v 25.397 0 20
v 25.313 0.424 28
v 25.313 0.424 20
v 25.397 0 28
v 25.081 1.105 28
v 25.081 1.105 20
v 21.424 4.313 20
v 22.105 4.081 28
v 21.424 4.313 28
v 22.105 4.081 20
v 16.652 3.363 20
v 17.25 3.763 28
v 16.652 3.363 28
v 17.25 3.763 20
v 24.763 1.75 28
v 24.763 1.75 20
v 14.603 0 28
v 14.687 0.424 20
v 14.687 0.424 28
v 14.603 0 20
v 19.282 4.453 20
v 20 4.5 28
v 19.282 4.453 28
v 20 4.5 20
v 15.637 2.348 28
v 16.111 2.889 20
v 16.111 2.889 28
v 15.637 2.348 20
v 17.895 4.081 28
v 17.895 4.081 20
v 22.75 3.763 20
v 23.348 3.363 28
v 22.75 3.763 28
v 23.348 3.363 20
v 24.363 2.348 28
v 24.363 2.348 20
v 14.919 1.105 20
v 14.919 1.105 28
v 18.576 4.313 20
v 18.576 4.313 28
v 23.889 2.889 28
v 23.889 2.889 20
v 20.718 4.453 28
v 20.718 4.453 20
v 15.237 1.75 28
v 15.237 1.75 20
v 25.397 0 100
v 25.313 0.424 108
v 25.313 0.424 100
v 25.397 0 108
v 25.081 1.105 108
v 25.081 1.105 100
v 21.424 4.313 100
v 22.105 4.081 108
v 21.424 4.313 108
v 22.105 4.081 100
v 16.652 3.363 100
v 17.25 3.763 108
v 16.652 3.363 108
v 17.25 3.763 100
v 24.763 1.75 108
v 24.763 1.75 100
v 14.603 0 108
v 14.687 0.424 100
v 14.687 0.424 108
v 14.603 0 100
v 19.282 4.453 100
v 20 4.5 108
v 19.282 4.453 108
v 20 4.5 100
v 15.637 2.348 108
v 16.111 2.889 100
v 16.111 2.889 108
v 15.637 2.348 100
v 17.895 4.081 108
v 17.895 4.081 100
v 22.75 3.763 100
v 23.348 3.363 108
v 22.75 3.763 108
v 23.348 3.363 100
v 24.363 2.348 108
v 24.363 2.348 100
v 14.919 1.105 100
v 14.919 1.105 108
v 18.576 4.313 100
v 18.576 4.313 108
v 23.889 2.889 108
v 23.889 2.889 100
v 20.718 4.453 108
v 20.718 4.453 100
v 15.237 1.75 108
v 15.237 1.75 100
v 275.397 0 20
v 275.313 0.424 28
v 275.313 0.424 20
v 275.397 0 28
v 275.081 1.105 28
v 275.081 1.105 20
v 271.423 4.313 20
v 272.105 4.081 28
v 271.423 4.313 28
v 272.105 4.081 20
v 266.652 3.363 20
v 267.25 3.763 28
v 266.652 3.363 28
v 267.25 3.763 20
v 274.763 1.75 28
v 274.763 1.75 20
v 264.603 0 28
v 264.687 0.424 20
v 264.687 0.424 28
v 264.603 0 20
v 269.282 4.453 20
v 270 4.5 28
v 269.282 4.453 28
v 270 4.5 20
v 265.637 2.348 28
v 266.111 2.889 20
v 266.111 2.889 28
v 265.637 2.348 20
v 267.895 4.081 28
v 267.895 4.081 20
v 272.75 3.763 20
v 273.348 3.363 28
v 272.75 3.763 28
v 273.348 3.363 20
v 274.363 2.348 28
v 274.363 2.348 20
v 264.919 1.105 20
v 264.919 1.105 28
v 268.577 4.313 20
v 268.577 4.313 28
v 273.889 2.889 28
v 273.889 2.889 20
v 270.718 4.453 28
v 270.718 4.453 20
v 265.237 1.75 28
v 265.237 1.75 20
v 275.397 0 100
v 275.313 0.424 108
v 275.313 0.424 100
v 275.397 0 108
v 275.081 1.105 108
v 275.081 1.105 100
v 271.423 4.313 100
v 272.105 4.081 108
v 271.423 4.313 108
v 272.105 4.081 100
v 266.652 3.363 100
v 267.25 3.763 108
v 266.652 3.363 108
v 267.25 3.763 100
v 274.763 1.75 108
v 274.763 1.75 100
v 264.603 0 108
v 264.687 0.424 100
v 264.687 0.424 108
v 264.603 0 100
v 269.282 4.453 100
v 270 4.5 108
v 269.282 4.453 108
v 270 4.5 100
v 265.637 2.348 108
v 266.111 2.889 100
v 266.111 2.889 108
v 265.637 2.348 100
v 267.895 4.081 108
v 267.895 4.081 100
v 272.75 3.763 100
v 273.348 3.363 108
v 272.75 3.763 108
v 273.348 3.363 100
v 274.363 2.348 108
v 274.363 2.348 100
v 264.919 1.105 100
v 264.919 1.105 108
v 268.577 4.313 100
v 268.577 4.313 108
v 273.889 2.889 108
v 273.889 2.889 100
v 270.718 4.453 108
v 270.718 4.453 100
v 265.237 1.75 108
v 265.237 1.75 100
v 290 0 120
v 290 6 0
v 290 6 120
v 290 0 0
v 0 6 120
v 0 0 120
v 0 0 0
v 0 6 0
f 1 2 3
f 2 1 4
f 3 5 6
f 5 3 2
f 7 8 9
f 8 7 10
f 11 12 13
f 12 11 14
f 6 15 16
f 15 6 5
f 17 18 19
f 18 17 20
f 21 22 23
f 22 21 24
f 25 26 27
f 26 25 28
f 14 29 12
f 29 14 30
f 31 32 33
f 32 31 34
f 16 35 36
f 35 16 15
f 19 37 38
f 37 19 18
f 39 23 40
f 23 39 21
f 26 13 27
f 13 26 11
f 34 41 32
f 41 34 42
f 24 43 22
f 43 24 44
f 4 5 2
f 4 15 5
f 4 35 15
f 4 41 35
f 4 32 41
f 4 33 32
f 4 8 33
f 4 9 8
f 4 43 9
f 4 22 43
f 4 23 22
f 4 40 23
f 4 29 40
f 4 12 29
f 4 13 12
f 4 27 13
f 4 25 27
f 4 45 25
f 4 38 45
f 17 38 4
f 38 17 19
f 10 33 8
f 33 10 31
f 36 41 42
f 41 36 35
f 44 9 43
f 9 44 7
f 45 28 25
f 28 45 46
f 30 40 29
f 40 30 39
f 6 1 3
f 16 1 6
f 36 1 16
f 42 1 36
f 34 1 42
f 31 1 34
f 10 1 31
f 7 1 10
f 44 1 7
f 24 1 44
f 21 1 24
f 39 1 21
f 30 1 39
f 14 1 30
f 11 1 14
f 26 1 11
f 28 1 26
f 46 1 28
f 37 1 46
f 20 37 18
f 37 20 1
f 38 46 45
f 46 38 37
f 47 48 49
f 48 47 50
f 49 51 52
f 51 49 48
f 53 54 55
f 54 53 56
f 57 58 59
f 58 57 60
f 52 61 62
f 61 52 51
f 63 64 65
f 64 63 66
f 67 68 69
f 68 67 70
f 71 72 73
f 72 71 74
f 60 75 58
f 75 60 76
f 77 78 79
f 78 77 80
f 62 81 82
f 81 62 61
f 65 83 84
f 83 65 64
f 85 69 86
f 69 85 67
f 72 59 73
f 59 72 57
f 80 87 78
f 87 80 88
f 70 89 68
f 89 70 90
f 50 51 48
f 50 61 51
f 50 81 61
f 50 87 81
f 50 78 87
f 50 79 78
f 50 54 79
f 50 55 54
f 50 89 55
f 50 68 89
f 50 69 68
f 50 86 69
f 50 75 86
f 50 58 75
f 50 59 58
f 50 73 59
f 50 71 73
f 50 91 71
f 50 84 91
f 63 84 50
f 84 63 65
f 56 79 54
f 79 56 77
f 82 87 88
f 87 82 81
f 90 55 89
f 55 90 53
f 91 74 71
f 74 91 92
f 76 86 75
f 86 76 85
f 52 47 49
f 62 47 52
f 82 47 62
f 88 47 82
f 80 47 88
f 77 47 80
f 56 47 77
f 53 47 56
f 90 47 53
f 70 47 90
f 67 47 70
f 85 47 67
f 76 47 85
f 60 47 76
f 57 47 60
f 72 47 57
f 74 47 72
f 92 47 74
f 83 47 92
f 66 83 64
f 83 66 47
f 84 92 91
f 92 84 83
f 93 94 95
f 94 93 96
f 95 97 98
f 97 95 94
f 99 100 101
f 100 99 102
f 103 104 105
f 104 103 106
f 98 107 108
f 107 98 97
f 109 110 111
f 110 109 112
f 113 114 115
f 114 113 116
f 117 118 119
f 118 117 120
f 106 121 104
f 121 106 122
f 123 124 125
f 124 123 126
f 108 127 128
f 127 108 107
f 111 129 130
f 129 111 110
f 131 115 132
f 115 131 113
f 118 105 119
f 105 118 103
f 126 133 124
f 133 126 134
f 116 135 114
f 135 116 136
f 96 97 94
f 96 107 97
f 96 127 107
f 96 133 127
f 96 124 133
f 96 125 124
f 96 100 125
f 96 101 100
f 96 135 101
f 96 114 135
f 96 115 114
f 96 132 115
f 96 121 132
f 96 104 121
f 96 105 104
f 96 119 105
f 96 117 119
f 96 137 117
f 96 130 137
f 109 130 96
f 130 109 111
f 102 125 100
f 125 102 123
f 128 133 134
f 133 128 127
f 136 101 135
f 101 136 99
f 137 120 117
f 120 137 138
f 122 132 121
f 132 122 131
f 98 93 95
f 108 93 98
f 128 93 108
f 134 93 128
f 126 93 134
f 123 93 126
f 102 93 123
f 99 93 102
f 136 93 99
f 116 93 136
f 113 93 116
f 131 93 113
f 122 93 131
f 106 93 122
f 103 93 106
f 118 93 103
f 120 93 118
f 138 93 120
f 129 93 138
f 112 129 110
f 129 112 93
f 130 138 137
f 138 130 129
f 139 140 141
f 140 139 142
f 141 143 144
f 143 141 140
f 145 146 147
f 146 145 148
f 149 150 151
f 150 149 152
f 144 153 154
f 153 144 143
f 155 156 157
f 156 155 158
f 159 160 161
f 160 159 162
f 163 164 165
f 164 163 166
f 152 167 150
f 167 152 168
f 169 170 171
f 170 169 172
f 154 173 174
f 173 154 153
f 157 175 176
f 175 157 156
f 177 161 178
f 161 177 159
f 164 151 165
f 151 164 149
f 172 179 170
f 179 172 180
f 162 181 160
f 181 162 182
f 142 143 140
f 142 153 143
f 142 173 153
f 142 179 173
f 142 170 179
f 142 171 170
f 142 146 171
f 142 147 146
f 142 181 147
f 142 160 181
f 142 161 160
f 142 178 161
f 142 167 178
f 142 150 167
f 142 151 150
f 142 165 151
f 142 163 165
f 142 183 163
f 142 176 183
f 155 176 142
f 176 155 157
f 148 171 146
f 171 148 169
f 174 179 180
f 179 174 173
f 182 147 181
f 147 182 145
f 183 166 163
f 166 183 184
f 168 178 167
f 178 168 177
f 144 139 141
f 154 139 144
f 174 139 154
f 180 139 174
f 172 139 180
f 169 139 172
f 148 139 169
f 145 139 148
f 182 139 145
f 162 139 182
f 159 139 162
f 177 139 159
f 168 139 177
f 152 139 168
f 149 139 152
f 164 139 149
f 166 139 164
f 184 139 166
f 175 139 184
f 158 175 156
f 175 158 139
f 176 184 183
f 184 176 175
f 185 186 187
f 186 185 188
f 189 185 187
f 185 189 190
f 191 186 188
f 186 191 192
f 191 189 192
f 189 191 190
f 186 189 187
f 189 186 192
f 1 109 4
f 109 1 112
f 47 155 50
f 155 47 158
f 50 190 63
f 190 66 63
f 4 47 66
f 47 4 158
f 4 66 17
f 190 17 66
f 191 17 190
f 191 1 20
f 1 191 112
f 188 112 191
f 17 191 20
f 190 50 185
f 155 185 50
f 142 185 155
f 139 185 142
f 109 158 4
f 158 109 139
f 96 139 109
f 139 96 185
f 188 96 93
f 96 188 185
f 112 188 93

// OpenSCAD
// block_bracket.scad
// ——————————————————————————————————————————————————
// Bolts to the two lower block‐ear bosses on a Volvo B‐series
// OUTPUT:  plate with two M10 holes at the correct spacing
// ——————————————————————————————————————————————————

/* ====== USER PARAMETERS ====== */
// center‐to‐center spacing between the two block‐ear bosses [X, Y] (mm)
ear_spacing = [250, 80];      
// bolt hole diameter (clearance for M10) (mm)
ear_hole_dia = 11;             
// bracket plate thickness (mm)
plate_thk = 6;                 
// extra margin around the holes (mm)
margin     = 20;               

/* ====== DERIVED SIZES ====== */
plate_size = [
  ear_spacing[0] + margin*2,
  ear_spacing[1] + margin*2
];

/* ====== MODULE ====== */
module block_bracket() {
  difference() {
    // outer face
    cube([ plate_size[0], plate_thk, plate_size[1] ], center=false);
    // bolt holes
    for (x_off = [ margin, margin + ear_spacing[0] ])
      for (y_off = [ margin, margin + ear_spacing[1] ])
        translate([ x_off, -1, y_off ])
          cylinder(h=plate_thk+2, r=ear_hole_dia/2, $fn=48);
  }
}

/* ====== RENDER ====== */
block_bracket();
